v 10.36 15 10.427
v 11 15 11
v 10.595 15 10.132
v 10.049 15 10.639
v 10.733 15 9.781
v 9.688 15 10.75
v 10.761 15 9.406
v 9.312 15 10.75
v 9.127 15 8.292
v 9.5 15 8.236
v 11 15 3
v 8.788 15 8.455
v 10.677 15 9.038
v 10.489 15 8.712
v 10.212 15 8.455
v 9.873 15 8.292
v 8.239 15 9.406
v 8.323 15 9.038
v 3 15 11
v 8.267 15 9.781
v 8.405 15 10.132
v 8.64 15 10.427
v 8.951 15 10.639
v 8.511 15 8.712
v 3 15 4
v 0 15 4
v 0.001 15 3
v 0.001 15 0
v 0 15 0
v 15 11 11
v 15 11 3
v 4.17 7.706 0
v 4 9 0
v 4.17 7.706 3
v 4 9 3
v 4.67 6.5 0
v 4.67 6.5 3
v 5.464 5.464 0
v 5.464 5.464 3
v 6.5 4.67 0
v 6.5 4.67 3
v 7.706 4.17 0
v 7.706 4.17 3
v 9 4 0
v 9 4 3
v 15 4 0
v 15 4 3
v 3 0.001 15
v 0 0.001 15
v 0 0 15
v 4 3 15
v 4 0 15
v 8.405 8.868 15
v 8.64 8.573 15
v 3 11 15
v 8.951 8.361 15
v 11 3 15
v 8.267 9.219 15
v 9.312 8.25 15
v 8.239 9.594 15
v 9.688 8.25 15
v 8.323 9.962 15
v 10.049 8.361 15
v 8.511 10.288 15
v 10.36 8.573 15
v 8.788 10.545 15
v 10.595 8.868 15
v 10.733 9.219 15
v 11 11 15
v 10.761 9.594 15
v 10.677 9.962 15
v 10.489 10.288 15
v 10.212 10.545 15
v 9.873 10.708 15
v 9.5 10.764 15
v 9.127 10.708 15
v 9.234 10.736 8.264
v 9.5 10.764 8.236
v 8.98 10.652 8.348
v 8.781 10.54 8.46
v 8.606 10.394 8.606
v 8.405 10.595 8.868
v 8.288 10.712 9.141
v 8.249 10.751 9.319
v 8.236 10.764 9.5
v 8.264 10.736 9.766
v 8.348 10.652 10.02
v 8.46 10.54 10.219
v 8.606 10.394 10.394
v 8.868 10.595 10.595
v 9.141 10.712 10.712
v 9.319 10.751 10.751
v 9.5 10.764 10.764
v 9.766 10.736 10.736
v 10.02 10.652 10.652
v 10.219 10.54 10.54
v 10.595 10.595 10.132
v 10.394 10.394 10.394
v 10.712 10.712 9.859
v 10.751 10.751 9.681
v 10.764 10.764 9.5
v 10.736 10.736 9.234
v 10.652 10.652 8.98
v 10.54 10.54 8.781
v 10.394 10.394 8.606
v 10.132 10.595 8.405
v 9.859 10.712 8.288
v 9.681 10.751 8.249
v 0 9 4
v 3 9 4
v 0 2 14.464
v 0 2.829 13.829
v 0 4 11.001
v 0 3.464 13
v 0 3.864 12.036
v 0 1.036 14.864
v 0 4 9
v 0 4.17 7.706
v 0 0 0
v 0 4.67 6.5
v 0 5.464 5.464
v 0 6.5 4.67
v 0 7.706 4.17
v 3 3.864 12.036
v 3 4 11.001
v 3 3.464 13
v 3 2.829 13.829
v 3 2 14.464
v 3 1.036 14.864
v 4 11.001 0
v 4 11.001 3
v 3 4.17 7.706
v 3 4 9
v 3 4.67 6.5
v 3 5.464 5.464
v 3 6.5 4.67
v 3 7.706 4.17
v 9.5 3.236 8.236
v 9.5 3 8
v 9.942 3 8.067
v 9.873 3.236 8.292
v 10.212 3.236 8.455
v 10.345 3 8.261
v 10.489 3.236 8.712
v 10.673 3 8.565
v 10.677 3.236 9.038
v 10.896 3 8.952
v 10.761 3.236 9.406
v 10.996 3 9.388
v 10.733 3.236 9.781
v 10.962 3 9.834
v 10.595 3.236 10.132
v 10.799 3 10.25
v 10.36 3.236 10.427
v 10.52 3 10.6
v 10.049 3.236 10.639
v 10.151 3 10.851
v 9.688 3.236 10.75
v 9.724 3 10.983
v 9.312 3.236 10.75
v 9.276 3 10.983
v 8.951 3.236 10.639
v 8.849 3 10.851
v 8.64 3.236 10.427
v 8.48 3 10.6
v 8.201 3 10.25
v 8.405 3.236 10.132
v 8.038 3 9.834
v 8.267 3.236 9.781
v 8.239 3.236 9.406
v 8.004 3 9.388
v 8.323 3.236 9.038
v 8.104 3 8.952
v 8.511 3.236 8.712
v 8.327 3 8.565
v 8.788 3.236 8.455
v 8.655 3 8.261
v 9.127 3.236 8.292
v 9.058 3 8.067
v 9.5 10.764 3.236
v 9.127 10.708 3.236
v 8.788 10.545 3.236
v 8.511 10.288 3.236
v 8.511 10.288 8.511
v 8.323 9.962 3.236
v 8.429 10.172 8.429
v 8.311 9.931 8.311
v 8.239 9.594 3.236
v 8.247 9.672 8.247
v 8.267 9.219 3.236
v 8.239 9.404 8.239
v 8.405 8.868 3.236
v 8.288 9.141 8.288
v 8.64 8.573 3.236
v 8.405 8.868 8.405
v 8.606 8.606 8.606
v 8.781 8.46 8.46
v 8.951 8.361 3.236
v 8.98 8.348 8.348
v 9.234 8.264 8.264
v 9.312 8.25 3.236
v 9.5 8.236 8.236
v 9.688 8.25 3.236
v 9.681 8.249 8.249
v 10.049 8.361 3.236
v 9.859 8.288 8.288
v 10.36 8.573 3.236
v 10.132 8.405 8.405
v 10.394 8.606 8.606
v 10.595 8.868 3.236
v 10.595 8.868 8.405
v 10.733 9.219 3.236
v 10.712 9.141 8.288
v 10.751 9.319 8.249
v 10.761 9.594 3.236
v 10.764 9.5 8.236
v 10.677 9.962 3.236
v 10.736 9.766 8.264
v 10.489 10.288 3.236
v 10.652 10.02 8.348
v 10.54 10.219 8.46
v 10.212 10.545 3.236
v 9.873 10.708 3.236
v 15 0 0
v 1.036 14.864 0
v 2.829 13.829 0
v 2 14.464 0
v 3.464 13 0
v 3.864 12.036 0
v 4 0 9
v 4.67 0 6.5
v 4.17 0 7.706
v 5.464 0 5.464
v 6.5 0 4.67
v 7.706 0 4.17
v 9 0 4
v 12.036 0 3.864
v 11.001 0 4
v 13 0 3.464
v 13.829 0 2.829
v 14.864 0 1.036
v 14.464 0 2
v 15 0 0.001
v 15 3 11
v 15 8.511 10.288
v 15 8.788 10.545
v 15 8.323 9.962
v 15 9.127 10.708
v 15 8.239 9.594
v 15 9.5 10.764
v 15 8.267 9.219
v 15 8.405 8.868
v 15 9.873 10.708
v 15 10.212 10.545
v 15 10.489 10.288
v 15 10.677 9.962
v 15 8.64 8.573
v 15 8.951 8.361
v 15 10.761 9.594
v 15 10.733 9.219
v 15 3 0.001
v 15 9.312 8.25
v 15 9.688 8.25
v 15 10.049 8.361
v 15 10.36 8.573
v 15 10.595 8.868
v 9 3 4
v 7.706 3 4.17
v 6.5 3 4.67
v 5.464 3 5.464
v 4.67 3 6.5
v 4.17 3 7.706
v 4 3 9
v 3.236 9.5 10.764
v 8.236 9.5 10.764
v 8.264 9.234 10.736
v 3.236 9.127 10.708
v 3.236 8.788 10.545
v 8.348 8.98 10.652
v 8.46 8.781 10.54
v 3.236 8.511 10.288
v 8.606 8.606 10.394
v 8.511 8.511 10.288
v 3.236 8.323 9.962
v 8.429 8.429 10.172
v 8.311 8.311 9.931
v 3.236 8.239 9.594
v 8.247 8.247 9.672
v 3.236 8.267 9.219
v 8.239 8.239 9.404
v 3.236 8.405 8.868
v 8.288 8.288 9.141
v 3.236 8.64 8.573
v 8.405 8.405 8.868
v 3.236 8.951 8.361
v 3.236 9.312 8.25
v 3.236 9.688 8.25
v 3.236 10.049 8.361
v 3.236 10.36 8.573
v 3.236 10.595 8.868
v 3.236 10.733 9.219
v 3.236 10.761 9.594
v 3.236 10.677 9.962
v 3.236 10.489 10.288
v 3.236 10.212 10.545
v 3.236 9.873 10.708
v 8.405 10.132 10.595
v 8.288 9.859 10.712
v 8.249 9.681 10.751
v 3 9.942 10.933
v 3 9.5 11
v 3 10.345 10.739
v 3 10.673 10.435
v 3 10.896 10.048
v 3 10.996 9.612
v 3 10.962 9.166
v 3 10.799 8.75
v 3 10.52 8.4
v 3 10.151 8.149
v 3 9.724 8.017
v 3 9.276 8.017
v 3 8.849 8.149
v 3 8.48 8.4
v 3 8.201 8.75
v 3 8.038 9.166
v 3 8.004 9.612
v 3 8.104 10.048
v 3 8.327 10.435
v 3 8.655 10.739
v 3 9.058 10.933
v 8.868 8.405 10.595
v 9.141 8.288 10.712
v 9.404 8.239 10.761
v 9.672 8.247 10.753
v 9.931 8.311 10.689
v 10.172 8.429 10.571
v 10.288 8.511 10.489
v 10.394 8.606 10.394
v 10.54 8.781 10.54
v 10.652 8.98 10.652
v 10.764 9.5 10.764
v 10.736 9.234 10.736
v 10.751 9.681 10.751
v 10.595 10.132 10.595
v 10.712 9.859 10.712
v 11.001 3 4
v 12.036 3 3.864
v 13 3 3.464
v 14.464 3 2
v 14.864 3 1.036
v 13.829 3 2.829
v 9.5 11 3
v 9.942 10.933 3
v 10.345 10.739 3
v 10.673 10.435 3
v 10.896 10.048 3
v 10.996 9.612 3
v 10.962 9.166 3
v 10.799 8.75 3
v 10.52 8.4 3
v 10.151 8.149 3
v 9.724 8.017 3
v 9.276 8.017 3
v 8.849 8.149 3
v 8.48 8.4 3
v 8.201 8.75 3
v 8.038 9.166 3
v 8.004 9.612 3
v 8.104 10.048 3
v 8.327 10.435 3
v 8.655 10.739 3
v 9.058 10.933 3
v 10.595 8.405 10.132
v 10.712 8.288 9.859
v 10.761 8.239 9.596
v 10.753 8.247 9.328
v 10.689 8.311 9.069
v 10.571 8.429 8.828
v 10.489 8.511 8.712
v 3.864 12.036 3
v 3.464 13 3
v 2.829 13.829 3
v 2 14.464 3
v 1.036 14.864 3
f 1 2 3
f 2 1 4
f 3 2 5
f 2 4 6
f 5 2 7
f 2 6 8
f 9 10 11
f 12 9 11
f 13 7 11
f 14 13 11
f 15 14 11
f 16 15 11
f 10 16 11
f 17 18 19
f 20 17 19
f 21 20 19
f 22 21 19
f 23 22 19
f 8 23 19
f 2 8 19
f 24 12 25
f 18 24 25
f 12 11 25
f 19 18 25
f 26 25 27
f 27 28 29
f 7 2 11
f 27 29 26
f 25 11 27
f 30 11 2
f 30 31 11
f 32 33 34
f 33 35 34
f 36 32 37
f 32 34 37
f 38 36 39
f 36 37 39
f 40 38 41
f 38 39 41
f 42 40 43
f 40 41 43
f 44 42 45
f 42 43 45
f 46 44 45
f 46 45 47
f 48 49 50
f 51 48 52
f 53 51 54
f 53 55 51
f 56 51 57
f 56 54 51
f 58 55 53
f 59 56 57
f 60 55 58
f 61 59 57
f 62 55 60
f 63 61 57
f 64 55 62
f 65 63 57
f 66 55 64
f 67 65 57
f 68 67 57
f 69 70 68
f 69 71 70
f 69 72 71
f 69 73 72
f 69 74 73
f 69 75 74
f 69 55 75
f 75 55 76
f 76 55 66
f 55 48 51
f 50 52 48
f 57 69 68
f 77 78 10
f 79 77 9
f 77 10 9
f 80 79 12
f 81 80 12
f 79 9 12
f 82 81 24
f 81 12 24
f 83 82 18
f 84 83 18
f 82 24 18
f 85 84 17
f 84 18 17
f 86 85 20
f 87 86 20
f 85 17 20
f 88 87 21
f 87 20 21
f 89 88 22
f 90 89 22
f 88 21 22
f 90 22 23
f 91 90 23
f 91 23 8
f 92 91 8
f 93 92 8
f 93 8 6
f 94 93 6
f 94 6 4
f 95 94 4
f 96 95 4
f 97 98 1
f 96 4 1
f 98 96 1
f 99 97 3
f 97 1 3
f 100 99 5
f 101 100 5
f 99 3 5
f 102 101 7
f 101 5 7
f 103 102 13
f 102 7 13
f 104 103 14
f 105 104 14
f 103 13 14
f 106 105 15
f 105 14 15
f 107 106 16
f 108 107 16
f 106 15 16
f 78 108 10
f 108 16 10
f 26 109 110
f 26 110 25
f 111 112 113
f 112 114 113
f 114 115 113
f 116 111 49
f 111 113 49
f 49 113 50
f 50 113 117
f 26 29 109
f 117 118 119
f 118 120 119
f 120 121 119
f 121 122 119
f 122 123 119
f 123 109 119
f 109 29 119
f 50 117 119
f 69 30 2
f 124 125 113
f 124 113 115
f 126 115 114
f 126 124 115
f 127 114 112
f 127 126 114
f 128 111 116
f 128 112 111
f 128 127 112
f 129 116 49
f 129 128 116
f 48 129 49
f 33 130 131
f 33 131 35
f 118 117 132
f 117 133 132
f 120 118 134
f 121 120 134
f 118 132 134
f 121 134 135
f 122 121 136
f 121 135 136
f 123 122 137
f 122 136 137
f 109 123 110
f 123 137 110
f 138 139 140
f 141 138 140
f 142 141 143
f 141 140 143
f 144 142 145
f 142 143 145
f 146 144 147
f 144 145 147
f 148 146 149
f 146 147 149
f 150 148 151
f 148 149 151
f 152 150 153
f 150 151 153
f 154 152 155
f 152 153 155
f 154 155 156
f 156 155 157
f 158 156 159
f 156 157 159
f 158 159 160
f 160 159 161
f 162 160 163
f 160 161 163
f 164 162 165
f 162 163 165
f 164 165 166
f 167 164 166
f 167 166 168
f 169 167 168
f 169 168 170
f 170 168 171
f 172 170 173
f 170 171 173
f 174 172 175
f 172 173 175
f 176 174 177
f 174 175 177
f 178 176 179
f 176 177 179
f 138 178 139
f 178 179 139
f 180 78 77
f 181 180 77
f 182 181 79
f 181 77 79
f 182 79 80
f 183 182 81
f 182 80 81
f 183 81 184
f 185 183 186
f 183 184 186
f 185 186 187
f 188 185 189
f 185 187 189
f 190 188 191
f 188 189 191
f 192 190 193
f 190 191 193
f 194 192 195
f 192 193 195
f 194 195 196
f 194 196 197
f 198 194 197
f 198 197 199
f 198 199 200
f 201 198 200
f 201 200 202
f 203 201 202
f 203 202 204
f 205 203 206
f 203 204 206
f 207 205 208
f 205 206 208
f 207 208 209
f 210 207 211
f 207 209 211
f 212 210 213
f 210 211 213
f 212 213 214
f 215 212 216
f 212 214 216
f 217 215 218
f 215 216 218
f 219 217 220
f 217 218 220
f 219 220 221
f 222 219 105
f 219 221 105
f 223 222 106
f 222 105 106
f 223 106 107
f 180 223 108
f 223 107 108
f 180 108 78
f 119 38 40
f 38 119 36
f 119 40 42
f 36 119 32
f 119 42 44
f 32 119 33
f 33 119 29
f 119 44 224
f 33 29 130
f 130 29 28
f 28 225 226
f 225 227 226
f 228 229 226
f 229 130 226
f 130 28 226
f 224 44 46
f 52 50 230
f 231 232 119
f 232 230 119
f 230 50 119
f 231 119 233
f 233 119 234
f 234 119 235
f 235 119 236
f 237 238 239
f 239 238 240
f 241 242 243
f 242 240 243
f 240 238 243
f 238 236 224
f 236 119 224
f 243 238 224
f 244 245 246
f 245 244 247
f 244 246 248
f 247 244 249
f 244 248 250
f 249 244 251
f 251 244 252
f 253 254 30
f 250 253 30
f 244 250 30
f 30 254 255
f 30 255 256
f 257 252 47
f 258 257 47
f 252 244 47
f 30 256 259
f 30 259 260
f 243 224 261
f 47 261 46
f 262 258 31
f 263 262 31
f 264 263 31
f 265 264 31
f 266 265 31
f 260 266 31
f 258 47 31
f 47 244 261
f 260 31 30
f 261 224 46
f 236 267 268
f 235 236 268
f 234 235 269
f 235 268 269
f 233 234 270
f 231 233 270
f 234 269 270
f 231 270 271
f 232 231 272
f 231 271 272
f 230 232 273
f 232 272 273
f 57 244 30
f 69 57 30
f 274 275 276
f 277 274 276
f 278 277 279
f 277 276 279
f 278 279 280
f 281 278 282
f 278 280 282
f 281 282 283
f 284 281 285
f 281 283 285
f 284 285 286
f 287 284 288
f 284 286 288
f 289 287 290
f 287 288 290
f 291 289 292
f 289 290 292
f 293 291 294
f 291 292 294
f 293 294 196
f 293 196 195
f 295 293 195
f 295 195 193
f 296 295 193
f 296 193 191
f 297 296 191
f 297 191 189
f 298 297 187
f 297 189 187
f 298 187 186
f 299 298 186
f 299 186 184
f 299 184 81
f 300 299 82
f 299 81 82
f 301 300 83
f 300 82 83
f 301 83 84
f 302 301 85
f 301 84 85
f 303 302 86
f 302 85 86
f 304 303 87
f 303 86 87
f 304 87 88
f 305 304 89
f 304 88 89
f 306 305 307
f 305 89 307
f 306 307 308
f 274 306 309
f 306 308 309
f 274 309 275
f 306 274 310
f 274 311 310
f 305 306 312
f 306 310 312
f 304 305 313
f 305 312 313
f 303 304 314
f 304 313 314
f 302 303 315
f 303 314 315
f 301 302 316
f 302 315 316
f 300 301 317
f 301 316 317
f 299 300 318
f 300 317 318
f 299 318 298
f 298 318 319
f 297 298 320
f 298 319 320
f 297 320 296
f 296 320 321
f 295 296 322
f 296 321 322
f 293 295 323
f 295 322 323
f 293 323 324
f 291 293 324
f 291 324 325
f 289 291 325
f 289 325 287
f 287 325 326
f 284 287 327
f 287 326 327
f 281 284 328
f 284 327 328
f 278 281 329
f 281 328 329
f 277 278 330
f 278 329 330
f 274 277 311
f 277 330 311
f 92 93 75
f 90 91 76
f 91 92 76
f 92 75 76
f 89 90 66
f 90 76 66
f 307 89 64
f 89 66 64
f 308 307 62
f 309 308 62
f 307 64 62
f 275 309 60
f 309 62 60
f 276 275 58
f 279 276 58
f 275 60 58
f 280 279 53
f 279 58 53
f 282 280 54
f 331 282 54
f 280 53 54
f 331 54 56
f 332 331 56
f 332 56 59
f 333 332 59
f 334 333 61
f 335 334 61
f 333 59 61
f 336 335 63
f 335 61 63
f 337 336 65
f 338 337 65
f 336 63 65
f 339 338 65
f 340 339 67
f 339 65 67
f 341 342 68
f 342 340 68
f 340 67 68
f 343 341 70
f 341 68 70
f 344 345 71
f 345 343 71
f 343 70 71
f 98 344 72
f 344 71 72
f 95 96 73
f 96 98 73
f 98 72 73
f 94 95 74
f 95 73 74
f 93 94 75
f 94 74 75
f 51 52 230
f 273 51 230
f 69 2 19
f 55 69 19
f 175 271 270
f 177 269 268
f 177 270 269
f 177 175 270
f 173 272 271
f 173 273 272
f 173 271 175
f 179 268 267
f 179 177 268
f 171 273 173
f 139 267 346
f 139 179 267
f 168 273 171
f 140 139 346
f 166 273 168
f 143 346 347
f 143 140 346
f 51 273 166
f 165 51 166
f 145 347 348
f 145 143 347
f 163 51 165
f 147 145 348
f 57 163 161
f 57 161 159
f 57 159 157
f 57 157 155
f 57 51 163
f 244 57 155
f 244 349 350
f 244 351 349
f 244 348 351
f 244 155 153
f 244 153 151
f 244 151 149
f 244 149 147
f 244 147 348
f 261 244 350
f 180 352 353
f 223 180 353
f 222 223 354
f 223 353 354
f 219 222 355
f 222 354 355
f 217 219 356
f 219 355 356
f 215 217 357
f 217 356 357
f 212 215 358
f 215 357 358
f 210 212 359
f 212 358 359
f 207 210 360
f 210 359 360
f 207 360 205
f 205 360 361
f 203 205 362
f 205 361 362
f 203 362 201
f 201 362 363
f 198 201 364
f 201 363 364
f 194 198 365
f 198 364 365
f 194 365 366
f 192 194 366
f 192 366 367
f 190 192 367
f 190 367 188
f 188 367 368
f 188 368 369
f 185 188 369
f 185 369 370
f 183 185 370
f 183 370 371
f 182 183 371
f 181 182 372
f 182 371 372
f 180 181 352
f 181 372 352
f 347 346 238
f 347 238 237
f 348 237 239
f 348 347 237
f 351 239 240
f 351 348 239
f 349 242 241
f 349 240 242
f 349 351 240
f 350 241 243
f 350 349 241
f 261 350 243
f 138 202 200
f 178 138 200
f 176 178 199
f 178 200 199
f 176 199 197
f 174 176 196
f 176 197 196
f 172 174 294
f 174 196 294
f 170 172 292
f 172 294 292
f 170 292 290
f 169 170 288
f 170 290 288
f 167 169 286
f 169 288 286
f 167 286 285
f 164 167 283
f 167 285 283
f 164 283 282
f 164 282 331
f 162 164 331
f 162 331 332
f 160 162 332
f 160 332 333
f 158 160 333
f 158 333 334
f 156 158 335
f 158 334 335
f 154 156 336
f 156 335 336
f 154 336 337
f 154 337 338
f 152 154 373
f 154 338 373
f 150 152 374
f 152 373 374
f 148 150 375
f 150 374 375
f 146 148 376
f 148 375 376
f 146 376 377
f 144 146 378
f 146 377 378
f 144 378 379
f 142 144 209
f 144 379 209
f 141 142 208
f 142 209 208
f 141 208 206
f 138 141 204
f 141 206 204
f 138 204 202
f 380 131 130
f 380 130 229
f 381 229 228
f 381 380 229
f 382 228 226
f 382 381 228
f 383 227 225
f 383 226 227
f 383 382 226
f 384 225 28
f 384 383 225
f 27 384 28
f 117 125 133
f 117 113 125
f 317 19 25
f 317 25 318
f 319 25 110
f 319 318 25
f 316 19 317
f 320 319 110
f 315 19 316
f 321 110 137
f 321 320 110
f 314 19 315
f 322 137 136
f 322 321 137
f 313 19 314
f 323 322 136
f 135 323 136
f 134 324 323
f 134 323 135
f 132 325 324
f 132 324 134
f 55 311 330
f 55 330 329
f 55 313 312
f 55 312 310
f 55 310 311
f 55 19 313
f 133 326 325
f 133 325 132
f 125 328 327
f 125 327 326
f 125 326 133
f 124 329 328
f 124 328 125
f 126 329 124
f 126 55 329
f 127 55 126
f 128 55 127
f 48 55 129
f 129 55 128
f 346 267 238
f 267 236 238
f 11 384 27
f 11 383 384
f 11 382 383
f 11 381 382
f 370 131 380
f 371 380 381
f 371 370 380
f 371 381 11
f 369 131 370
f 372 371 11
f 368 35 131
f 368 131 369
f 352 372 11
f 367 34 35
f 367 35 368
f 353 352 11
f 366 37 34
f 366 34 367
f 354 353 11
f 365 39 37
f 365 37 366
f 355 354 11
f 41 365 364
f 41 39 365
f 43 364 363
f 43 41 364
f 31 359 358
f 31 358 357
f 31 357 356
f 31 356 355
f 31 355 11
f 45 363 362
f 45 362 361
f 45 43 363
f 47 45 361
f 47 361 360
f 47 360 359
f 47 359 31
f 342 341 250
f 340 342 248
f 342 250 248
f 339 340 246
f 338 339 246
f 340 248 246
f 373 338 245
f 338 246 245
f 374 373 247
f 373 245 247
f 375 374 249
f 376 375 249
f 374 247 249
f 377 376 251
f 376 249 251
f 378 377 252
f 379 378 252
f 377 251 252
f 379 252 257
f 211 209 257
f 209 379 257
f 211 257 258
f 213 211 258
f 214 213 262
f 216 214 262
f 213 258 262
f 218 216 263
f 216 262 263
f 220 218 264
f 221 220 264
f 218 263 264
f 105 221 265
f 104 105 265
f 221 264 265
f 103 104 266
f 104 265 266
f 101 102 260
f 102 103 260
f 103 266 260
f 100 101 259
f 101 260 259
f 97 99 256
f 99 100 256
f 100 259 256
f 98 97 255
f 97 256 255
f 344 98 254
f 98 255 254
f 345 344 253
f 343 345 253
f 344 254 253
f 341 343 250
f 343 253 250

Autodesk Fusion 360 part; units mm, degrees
sketch "Sketch1" plane through (0, 0, 0) normal (0, 0, 1) x (1, 0, 0)
  line L0 (0, 0) -> (15, 0)
  line L1 (15, 0) -> (15, 15)
  line L2 (15, 15) -> (0, 15)
  line L3 (0, 15) -> (0, 0)
  dimension "d5" = 15
  dimension "d6" = 15
extrude "Extrude1" add sketch "Sketch1" along normal blind 15
sketch "Sketch2" plane through (0, 0, 0) normal (0, -1, 0) x (1, 0, 0)
  line L0 (0, 0) -> (15, 0)
  line L1 (15, 0) -> (15, 15)
  line L2 (15, 15) -> (0, 15)
  line L3 (0, 15) -> (0, 0)
  line L4 (4, 4) -> (15, 4)
  line L5 (15, 4) -> (15, 15)
  line L6 (15, 15) -> (4, 15)
  line L7 (4, 15) -> (4, 4)
  point P0 (4, 4)
  dimension "d9" = 4
  dimension "d10" = 4
extrude "Extrude2" cut sketch "Sketch2" against normal blind 3 contours L1 L2 L4 L5 L6 L7
sketch "Sketch3" plane through (0, 0, 0) normal (-1, 0, 0) x (0, -1, 0)
  line L0 (-15, 0) -> (0, 0)
  line L1 (0, 0) -> (0, 15)
  line L2 (0, 15) -> (-15, 15)
  line L3 (-15, 15) -> (-15, 0)
  line L4 (-4, 4) -> (-15, 4)
  line L5 (-15, 4) -> (-15, 15)
  line L6 (-15, 15) -> (-4, 15)
  line L7 (-4, 15) -> (-4, 4)
  point P0 (-4, 4)
  dimension "d14" = 4
  dimension "d15" = 4
extrude "Extrude3" cut sketch "Sketch3" against normal blind 3 contours L2 L3 L4 L5 L6 L7
sketch "Sketch4" plane through (0, 0, 0) normal (0, 0, -1) x (1, 0, 0)
  line L0 (0, 0) -> (0, -15)
  line L1 (0, -15) -> (15, -15)
  line L2 (15, -15) -> (15, 0)
  line L3 (15, 0) -> (0, 0)
  line L4 (4, -4) -> (15, -4)
  line L5 (15, -4) -> (15, -15)
  line L6 (15, -15) -> (4, -15)
  line L7 (4, -15) -> (4, -4)
  point P0 (4, -4)
  dimension "d18" = 4
  dimension "d19" = 4
extrude "Extrude4" cut sketch "Sketch4" against normal blind 3 contours L1 L2 L4 L5 L6 L7
sketch "Sketch5" plane through (0, 3, 0) normal (0, -1, 0) x (1, 0, 0)
  line L0 (4, 15) -> (4, 4)
  line L1 (4, 4) -> (15, 4)
  line L2 (15, 4) -> (15, 15)
  line L3 (15, 15) -> (4, 15)
  point P0 (9.5, 9.5)
  dimension "d42" = 5.5
  dimension "d43" = 5.5
sketch "Sketch6" plane through (3, 0, 0) normal (-1, 0, 0) x (0, -1, 0)
  line L0 (-4, 15) -> (-15, 15)
  line L1 (-15, 15) -> (-15, 4)
  line L2 (-15, 4) -> (-4, 4)
  line L3 (-4, 4) -> (-4, 15)
  point P0 (-9.5, 9.5)
  dimension "d44" = 5.5
  dimension "d45" = 5.5
sketch "Sketch7" plane through (0, 0, 3) normal (0, 0, -1) x (1, 0, 0)
  line L0 (4, -15) -> (15, -15)
  line L1 (15, -15) -> (15, -4)
  line L2 (15, -4) -> (4, -4)
  line L3 (4, -4) -> (4, -15)
  point P0 (9.5, -9.5)
  dimension "d46" = 5.5
  dimension "d47" = 5.5
hole "Hole4" at (9.5, 3, 9.5) direction (0, 1, 0) diameter 2.529 end through all countersink diameter 3 countersink angle 90
hole "Hole5" at (3, 9.5, 9.5) direction (1, 0, 0) diameter 2.529 end through all countersink diameter 3 countersink angle 90
hole "Hole6" at (9.5, 9.5, 3) direction (0, 0, 1) diameter 2.529 end through all countersink diameter 3 countersink angle 90
fillet "Fillet3" radius 5 3 edges at (4, 1.5, 4) (1.5, 4, 4) (4, 4, 1.5)
chamfer "Chamfer2" distance 4 angle 45 3 edges at (15, 9, 15) (15, 15, 9) (9, 15, 15)
fillet "Fillet4" radius 4 3 edges at (1.5, 4, 15) (15, 1.5, 4) (4, 15, 1.5)
equation "length_rib = 15 mm"
equation "distance_corner = 4 mm"
equation "distance_remaining = length_rib - distance_corner"
equation "distance_hole = distance_remaining / 2"
equation "d5 = length_rib"
equation "d6 = length_rib"
equation "d7 = length_rib"
equation "d9 = distance_corner"
equation "d10 = distance_corner"
equation "plate_thickness = 3 mm"
equation "d14 = distance_corner"
equation "d15 = distance_corner"
equation "d18 = distance_corner"
equation "d19 = distance_corner"
equation "d42 = distance_remaining / 2"
equation "d43 = distance_remaining / 2"
equation "d44 = distance_remaining / 2"
equation "d45 = distance_remaining / 2"
equation "d46 = distance_remaining / 2"
equation "d47 = distance_remaining / 2"
